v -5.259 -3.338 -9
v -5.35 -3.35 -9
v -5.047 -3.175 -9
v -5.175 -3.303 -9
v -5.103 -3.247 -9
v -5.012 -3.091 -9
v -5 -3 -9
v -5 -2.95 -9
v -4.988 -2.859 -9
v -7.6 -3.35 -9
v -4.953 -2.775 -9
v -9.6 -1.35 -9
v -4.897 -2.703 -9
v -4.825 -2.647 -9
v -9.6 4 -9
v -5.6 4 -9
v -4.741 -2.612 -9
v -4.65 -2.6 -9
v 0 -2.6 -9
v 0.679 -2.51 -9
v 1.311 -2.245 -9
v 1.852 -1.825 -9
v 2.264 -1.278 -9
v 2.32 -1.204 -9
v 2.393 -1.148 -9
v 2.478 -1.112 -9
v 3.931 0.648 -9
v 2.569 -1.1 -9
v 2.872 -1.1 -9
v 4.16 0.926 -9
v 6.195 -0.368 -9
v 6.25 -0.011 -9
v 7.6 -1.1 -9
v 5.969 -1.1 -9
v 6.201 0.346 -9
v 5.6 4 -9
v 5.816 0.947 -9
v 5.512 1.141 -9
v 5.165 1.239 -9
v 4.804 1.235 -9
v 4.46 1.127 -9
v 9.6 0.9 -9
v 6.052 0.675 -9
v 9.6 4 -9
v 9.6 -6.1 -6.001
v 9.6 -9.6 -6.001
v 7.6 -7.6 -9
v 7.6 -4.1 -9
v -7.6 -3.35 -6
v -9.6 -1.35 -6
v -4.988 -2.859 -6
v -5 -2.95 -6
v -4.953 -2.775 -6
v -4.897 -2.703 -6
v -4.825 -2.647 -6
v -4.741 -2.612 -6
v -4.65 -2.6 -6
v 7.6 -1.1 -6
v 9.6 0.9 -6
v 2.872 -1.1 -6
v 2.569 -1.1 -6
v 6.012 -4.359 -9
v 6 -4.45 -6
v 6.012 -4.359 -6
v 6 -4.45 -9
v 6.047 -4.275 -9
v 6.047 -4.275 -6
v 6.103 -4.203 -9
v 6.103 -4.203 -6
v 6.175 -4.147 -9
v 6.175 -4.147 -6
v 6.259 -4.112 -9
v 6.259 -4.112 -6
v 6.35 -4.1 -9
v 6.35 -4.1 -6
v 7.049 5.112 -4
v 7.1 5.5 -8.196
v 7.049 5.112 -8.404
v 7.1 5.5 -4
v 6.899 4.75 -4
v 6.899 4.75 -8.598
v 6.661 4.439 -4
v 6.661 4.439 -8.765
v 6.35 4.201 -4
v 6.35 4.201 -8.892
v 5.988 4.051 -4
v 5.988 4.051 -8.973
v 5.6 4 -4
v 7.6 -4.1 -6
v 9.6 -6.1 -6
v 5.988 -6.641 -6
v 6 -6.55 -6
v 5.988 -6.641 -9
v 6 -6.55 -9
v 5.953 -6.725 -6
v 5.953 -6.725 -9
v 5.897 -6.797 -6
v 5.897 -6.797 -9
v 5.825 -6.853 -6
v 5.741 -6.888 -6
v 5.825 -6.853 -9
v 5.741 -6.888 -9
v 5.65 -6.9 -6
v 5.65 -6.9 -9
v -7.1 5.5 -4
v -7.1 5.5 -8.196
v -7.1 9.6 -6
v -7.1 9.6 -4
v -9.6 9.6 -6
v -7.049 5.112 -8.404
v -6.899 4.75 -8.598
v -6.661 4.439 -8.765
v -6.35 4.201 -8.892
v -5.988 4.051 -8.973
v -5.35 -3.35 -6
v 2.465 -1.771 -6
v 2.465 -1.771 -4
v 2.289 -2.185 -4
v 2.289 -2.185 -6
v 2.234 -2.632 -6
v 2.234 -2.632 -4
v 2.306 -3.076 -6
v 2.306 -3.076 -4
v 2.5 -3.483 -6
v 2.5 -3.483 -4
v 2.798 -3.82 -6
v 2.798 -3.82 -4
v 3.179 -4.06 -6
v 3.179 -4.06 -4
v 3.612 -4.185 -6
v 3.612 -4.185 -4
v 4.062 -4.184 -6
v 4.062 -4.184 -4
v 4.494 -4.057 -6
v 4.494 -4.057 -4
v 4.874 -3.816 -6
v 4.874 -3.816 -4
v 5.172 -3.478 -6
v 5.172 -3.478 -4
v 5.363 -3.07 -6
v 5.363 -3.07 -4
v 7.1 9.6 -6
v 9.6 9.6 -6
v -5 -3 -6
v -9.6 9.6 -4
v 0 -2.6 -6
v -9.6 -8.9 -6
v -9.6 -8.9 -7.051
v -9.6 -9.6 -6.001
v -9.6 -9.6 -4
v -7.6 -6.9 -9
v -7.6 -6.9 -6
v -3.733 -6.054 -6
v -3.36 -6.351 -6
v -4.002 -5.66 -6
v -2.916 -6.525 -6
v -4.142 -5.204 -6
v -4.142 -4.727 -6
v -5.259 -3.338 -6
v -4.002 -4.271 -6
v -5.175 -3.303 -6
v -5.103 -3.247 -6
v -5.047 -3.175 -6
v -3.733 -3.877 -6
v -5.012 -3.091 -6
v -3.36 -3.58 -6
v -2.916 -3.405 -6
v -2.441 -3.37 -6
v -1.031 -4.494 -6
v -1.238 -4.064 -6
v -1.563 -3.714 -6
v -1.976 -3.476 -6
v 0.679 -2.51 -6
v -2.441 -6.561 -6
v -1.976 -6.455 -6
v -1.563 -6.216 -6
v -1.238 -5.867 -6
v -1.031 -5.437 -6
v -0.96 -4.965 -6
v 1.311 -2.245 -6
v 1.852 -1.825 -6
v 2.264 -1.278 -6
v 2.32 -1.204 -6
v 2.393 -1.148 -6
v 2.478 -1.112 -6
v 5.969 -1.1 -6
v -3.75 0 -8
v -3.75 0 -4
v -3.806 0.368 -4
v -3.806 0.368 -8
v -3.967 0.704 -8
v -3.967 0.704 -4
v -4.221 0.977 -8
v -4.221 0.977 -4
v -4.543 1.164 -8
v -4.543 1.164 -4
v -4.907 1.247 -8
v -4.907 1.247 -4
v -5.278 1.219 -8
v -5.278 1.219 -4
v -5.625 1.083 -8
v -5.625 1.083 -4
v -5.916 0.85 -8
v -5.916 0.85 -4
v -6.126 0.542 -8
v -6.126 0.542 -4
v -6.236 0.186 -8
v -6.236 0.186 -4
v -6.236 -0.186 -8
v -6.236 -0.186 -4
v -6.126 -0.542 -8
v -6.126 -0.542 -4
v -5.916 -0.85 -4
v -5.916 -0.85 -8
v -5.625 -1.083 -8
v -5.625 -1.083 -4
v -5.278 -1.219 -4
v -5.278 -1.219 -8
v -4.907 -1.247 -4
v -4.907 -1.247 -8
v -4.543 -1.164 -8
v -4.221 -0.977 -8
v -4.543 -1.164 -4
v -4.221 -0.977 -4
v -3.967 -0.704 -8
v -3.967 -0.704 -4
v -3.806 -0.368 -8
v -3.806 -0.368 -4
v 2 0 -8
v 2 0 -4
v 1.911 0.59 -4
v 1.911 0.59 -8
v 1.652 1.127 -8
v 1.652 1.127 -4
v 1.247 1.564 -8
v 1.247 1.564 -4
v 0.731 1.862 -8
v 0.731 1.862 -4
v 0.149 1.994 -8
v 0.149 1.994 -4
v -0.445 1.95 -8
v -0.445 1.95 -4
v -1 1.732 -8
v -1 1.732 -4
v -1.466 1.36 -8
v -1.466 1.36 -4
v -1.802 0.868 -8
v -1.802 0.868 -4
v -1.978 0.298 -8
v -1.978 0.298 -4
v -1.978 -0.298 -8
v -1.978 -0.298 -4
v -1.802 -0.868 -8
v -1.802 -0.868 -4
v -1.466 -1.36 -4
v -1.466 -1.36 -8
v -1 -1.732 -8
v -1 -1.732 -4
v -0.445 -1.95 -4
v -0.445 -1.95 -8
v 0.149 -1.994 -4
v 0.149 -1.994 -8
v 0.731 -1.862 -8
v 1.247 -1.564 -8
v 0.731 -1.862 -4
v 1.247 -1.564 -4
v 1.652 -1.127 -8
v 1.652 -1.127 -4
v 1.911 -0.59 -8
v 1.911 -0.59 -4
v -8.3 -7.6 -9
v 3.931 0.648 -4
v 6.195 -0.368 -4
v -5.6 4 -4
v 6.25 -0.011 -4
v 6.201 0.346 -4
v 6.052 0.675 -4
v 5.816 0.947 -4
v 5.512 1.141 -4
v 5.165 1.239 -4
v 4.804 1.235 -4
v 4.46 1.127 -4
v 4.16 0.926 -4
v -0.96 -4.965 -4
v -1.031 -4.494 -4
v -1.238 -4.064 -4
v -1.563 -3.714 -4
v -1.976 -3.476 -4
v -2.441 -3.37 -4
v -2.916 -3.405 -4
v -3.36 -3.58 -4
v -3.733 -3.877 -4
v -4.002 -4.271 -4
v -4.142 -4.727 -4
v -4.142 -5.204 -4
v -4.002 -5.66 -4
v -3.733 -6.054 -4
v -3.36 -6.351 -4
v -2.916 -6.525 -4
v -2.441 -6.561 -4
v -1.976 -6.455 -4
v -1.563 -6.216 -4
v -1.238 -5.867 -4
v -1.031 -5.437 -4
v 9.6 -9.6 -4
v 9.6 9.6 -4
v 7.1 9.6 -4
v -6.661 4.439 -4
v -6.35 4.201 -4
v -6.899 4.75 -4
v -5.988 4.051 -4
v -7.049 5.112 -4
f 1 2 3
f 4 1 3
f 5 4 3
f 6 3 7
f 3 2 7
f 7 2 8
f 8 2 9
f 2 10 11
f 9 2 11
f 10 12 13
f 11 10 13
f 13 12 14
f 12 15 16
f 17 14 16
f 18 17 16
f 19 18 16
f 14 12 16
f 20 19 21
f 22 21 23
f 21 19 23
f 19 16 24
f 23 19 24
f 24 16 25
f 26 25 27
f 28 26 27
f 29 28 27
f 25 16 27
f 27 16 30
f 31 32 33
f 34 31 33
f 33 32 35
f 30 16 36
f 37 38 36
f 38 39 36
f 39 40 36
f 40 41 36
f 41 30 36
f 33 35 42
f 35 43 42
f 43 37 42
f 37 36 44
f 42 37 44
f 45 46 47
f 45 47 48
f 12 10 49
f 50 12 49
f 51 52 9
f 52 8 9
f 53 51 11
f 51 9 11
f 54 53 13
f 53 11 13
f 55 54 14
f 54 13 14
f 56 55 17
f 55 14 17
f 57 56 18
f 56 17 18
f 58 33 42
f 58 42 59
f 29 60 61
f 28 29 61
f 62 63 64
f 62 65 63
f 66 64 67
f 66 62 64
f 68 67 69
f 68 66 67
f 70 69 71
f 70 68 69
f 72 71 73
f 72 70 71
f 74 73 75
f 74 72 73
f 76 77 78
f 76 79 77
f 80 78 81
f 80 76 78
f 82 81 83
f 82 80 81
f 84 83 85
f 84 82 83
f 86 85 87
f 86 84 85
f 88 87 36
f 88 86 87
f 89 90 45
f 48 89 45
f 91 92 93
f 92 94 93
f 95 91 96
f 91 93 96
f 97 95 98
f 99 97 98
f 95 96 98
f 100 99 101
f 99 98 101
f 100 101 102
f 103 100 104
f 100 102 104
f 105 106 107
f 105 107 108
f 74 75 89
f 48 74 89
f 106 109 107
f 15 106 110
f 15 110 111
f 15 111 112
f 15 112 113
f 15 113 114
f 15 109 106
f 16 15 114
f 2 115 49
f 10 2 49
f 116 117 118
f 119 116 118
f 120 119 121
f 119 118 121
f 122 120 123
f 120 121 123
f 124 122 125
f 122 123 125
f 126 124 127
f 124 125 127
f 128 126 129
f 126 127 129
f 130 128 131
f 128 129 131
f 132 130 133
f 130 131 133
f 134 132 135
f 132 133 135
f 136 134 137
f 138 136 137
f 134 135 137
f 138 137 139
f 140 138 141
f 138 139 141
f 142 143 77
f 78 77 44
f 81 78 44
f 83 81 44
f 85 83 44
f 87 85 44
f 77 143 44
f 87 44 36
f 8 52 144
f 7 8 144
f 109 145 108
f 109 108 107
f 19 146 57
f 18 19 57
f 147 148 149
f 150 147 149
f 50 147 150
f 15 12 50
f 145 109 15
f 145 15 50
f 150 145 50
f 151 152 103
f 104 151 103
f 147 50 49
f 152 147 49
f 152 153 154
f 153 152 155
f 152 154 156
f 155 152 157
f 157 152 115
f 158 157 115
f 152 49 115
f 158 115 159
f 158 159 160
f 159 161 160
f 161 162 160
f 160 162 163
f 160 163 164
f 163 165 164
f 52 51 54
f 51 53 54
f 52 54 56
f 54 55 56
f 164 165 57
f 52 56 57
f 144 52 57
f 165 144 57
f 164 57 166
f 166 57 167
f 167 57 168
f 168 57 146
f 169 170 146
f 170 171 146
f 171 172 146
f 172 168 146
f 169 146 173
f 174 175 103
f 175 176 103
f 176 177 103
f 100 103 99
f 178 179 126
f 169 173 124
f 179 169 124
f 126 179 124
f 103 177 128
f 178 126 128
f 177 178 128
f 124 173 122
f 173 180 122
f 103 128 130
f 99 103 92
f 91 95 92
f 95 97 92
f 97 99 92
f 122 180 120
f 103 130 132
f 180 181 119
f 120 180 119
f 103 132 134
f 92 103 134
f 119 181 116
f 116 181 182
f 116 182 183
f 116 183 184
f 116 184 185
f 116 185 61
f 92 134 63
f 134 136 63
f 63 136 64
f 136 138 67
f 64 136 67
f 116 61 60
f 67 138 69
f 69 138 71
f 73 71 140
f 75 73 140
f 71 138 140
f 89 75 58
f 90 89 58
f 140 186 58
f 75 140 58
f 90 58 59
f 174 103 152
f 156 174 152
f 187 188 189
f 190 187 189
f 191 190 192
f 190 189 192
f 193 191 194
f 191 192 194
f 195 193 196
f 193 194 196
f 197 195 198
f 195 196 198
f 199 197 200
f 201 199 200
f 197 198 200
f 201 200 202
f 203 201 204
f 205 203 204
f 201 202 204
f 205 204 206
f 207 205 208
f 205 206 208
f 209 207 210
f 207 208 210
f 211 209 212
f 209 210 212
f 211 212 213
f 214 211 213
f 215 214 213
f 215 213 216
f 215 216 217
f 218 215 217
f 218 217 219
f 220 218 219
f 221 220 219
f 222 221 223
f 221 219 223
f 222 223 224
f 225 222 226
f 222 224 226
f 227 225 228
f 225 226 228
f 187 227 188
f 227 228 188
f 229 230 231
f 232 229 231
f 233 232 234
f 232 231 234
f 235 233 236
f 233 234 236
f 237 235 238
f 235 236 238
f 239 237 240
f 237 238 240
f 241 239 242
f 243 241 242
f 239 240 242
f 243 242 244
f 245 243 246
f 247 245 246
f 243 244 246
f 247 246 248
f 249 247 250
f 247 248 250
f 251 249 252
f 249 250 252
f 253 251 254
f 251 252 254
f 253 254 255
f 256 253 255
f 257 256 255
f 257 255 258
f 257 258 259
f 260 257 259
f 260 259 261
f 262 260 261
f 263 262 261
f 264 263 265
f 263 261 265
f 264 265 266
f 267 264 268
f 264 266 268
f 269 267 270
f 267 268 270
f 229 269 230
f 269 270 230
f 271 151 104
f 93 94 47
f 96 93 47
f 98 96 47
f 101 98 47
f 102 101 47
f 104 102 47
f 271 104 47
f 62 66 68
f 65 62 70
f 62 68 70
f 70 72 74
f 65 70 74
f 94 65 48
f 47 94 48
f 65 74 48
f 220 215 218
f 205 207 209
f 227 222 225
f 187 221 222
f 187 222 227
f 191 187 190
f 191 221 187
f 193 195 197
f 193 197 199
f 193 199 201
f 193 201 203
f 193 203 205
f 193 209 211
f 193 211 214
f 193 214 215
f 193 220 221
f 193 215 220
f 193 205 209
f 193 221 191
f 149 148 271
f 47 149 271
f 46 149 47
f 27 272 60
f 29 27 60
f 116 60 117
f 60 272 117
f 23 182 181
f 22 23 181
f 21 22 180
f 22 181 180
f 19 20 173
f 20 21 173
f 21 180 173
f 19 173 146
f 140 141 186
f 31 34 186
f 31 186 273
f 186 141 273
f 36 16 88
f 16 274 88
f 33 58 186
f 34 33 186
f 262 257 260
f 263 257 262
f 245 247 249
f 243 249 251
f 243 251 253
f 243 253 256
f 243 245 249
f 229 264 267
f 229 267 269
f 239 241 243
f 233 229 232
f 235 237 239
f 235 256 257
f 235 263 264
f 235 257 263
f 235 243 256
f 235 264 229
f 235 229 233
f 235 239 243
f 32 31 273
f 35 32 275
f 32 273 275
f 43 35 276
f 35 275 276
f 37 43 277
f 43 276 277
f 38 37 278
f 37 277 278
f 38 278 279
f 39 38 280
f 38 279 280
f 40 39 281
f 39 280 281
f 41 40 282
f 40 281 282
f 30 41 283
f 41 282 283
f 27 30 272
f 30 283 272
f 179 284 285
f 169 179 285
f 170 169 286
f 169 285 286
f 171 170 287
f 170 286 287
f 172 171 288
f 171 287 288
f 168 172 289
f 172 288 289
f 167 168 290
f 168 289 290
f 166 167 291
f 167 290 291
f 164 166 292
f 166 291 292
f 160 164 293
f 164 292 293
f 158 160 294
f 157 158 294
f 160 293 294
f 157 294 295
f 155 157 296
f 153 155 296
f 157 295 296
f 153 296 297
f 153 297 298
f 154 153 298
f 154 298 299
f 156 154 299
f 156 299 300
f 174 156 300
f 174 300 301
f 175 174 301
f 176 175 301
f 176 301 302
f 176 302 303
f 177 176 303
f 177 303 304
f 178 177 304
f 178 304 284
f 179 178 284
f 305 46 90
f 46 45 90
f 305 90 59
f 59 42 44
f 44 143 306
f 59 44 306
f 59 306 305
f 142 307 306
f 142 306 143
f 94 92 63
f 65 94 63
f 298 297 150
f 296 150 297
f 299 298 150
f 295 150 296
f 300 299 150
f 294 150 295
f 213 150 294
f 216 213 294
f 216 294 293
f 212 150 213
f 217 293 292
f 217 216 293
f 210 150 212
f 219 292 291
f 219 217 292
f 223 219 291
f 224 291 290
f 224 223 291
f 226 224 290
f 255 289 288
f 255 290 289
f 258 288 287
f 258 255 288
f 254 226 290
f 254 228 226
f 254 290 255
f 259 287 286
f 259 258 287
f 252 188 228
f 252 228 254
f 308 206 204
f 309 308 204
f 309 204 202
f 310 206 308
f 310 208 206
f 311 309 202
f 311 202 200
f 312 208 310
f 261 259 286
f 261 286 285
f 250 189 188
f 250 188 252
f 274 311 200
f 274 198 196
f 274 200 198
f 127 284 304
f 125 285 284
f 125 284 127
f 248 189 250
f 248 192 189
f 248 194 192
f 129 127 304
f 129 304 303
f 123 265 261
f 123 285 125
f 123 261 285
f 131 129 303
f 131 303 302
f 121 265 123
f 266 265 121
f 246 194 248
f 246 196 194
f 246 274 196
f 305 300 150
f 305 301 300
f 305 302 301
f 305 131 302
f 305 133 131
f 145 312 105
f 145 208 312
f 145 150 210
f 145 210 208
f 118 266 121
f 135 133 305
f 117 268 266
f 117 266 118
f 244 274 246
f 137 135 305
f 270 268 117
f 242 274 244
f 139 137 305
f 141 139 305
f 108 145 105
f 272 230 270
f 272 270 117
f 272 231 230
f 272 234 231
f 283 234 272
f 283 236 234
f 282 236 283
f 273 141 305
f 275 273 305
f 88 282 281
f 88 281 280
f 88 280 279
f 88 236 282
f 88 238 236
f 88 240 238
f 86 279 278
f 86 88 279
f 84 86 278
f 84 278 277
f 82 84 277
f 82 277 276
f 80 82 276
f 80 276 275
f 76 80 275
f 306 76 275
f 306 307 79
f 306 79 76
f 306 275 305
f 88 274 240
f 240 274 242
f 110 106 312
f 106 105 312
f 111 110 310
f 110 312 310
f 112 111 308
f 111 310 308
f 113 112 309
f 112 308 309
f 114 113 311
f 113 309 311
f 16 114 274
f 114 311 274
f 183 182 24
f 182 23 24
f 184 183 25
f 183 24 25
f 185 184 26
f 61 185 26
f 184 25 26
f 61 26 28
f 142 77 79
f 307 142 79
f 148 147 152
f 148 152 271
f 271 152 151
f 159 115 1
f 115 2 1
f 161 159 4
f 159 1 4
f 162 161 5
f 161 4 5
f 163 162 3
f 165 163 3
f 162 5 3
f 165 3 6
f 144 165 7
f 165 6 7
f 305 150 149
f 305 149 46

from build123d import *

# Parameters (mm, degrees)
OUTER_FRAME_EXTRUDE_DEPTH      = 5
OUTER_FRAME_EXTRUDE_DEPTH_BACK = 2
OUTSIDE_FRAME_W                = 19.2
OUTSIDE_FRAME_H                = 19.2
OUTSIDE_FRAME_W_2              = 14.2
OUTSIDE_FRAME_H_2              = 14.2
HOTSWAP_BASE_W                 = 19.2
HOTSWAP_BASE_H                 = 13.6
HOTSWAP_BASE_BLOCK_DEPTH       = 5
CUT_EXTRUDE4_DEPTH             = 17.288646353
CUT_EXTRUDE4_DEPTH_BACK        = 17.288646353
SKETCH1_W                      = 2
SKETCH1_H                      = 5.6
CUT_EXTRUDE1_DEPTH             = 4
SWITCH_PIN_HOLES_R             = 2
SWITCH_PIN_HOLES_R_2           = 1.25
SWITCH_HOLES_DEPTH             = 4
HOTSWAP_HOLES_R                = 1.6
CUT_EXTRUDE3_DEPTH             = 17.288646353
CHAMFER1_SIZE                  = 2
BOSS_EXTRUDE2_DEPTH            = 2.5
BOSS_EXTRUDE3_DEPTH            = 2.5
FILLET1_R                      = 0.35
FILLET2_R                      = 1.5
SPLIT1_START                   = -4
SPLIT1_OUTLINE_W               = 19.2
SPLIT1_OUTLINE_H               = 19.2
SPLIT1_OUTLINE_W_2             = 14.2
SPLIT1_OUTLINE_H_2             = 14.2
SPLIT1_DEPTH                   = 5
CHAMFER2_SIZE                  = 2
CHAMFER2_SIZE2                 = 2.998873489


# Read off the part's stored shape, not the designer's step: Split1
with BuildPart() as part:
    # Outside Frame → Outer Frame Extrude (new, two sides: drawn at the far end of the back side and taken through both)
    with BuildSketch(Plane.XY.offset(-4).offset(-OUTER_FRAME_EXTRUDE_DEPTH_BACK)):
        Rectangle(OUTSIDE_FRAME_W, OUTSIDE_FRAME_H)
        Rectangle(OUTSIDE_FRAME_W_2, OUTSIDE_FRAME_H_2, mode=Mode.SUBTRACT)
    extrude(amount=OUTER_FRAME_EXTRUDE_DEPTH + OUTER_FRAME_EXTRUDE_DEPTH_BACK)

    # Hotswap Base → Hotswap Base Block (add)
    with BuildSketch(Plane.XY.offset(-4)):
        with Locations((0, -2.8)):
            Rectangle(HOTSWAP_BASE_W, HOTSWAP_BASE_H)
    extrude(amount=-HOTSWAP_BASE_BLOCK_DEPTH)

    # Sketch1 → Cut-Extrude4 (cut, two sides: drawn at the far end of the back side and taken through both)
    with BuildSketch(Plane(origin=(0, 0, 0), x_dir=(0, 0, -1), z_dir=(1, 0, 0)).offset(-CUT_EXTRUDE4_DEPTH_BACK)):
        with Locations((5, 6.8)):
            Rectangle(SKETCH1_W, SKETCH1_H)
    extrude(amount=CUT_EXTRUDE4_DEPTH + CUT_EXTRUDE4_DEPTH_BACK, mode=Mode.SUBTRACT)

    # Hotswap Well → Cut-Extrude1 (cut)
    with BuildSketch(Plane(origin=(0, 0, -6), x_dir=(-1, 0, 0), z_dir=(0, 0, -1))):
        with BuildLine():
            Line((-10, -1.1), (-2.355843798, -1.1))
            ThreePointArc((-2.355843798, -1.1), (-1.396424004, -2.19317122), (0, -2.6))
            Line((0, -2.6), (5, -2.6))
            Line((5, -2.6), (5, -3.35))
            Line((5, -3.35), (10, -3.35))
            Line((10, -3.35), (10, -6.9))
            Line((10, -6.9), (-6, -6.9))
            Line((-6, -6.9), (-6, -4.1))
            Line((-6, -4.1), (-10, -4.1))
            Line((-10, -4.1), (-10, -1.1))
        make_face()
    extrude(amount=CUT_EXTRUDE1_DEPTH, mode=Mode.SUBTRACT)

    # Switch Pin Holes → Switch Holes (cut)
    with BuildSketch(Plane.XY.offset(-4)):
        Circle(SWITCH_PIN_HOLES_R)
        with Locations((-5, 0)):
            Circle(SWITCH_PIN_HOLES_R_2)
        with Locations((5, 0)):
            Circle(SWITCH_PIN_HOLES_R_2)
    extrude(amount=-SWITCH_HOLES_DEPTH, mode=Mode.SUBTRACT)

    # Hotswap Holes → Cut-Extrude3 (cut, through all)
    with BuildSketch(Plane.XY):
        with Locations((-2.560136595, -4.965291588)):
            Circle(HOTSWAP_HOLES_R)
        with BuildLine():
            Line((3.930924016, 0.647747281), (2.46548889, -1.77088348))
            ThreePointArc((2.46548889, -1.77088348), (3.179147124, -4.059894044), (5.3631684, -3.070485887))
            Line((5.3631684, -3.070485887), (6.194736133, -0.367567099))
            ThreePointArc((6.194736133, -0.367567099), (5.511530489, 1.140542222), (3.930924016, 0.647747281))
        make_face()
    extrude(amount=-CUT_EXTRUDE3_DEPTH, mode=Mode.SUBTRACT)

    # Chamfer1
    chamfer1_edges = [part.edges().sort_by_distance(p)[0] for p in [
        (9.6, -4.1, -7.5),
        (-9.6, -6.9, -7.5),
        (-9.6, -3.35, -7.5),
        (9.6, -1.1, -7.5),
    ]]
    chamfer(chamfer1_edges, length=CHAMFER1_SIZE)

    # Sketch2 → Boss-Extrude2 (add)
    with BuildSketch(Plane(origin=(9.6, 0, 0), x_dir=(0, 0, -1), z_dir=(1, 0, 0))):
        Polygon((6, 9.6), (9, 4), (4, 4), (4, 9.6), align=None)
    extrude(amount=-BOSS_EXTRUDE2_DEPTH)

    # Sketch3 → Boss-Extrude3 (add)
    with BuildSketch(Plane.ZY.offset(9.6)):
        Polygon((-4, 9.6), (-6, 9.6), (-9, 4), (-4, 4), align=None)
    extrude(amount=-BOSS_EXTRUDE3_DEPTH)

    # Fillet1
    fillet1_edges = [part.edges().sort_by_distance(p)[0] for p in [
        (6, -4.1, -7.5),
        (-5, -3.35, -7.5),
        (-5, -2.6, -7.5),
        (6, -6.9, -7.5),
        (2.355843798, -1.1, -7.5),
    ]]
    fillet(fillet1_edges, radius=FILLET1_R)

    # Fillet2
    fillet2_edges = [part.edges().sort_by_distance(p)[0] for p in [
        (7.1, 4, -6.5),
        (-7.1, 4, -6.5),
    ]]
    fillet(fillet2_edges, radius=FILLET2_R)

    # Split1 outline → Split1 (cut)
    with BuildSketch(Plane.XY.offset(SPLIT1_START)):
        Rectangle(SPLIT1_OUTLINE_W, SPLIT1_OUTLINE_H)
        Rectangle(SPLIT1_OUTLINE_W_2, SPLIT1_OUTLINE_H_2, mode=Mode.SUBTRACT)
    extrude(amount=SPLIT1_DEPTH, mode=Mode.SUBTRACT)

    # Chamfer2
    chamfer2_edges = [part.edges().sort_by_distance(p)[0] for p in [
        (9.6, -7.85, -9),
        (0, -9.6, -9),
    ]]
    chamfer2_side = [part.faces().sort_by_distance(p)[0] for p in [
        (1.357387596, -7.916485347, -9),
    ]]
    chamfer(chamfer2_edges, length=CHAMFER2_SIZE, length2=CHAMFER2_SIZE2, reference=chamfer2_side[0])


solid = part.part
